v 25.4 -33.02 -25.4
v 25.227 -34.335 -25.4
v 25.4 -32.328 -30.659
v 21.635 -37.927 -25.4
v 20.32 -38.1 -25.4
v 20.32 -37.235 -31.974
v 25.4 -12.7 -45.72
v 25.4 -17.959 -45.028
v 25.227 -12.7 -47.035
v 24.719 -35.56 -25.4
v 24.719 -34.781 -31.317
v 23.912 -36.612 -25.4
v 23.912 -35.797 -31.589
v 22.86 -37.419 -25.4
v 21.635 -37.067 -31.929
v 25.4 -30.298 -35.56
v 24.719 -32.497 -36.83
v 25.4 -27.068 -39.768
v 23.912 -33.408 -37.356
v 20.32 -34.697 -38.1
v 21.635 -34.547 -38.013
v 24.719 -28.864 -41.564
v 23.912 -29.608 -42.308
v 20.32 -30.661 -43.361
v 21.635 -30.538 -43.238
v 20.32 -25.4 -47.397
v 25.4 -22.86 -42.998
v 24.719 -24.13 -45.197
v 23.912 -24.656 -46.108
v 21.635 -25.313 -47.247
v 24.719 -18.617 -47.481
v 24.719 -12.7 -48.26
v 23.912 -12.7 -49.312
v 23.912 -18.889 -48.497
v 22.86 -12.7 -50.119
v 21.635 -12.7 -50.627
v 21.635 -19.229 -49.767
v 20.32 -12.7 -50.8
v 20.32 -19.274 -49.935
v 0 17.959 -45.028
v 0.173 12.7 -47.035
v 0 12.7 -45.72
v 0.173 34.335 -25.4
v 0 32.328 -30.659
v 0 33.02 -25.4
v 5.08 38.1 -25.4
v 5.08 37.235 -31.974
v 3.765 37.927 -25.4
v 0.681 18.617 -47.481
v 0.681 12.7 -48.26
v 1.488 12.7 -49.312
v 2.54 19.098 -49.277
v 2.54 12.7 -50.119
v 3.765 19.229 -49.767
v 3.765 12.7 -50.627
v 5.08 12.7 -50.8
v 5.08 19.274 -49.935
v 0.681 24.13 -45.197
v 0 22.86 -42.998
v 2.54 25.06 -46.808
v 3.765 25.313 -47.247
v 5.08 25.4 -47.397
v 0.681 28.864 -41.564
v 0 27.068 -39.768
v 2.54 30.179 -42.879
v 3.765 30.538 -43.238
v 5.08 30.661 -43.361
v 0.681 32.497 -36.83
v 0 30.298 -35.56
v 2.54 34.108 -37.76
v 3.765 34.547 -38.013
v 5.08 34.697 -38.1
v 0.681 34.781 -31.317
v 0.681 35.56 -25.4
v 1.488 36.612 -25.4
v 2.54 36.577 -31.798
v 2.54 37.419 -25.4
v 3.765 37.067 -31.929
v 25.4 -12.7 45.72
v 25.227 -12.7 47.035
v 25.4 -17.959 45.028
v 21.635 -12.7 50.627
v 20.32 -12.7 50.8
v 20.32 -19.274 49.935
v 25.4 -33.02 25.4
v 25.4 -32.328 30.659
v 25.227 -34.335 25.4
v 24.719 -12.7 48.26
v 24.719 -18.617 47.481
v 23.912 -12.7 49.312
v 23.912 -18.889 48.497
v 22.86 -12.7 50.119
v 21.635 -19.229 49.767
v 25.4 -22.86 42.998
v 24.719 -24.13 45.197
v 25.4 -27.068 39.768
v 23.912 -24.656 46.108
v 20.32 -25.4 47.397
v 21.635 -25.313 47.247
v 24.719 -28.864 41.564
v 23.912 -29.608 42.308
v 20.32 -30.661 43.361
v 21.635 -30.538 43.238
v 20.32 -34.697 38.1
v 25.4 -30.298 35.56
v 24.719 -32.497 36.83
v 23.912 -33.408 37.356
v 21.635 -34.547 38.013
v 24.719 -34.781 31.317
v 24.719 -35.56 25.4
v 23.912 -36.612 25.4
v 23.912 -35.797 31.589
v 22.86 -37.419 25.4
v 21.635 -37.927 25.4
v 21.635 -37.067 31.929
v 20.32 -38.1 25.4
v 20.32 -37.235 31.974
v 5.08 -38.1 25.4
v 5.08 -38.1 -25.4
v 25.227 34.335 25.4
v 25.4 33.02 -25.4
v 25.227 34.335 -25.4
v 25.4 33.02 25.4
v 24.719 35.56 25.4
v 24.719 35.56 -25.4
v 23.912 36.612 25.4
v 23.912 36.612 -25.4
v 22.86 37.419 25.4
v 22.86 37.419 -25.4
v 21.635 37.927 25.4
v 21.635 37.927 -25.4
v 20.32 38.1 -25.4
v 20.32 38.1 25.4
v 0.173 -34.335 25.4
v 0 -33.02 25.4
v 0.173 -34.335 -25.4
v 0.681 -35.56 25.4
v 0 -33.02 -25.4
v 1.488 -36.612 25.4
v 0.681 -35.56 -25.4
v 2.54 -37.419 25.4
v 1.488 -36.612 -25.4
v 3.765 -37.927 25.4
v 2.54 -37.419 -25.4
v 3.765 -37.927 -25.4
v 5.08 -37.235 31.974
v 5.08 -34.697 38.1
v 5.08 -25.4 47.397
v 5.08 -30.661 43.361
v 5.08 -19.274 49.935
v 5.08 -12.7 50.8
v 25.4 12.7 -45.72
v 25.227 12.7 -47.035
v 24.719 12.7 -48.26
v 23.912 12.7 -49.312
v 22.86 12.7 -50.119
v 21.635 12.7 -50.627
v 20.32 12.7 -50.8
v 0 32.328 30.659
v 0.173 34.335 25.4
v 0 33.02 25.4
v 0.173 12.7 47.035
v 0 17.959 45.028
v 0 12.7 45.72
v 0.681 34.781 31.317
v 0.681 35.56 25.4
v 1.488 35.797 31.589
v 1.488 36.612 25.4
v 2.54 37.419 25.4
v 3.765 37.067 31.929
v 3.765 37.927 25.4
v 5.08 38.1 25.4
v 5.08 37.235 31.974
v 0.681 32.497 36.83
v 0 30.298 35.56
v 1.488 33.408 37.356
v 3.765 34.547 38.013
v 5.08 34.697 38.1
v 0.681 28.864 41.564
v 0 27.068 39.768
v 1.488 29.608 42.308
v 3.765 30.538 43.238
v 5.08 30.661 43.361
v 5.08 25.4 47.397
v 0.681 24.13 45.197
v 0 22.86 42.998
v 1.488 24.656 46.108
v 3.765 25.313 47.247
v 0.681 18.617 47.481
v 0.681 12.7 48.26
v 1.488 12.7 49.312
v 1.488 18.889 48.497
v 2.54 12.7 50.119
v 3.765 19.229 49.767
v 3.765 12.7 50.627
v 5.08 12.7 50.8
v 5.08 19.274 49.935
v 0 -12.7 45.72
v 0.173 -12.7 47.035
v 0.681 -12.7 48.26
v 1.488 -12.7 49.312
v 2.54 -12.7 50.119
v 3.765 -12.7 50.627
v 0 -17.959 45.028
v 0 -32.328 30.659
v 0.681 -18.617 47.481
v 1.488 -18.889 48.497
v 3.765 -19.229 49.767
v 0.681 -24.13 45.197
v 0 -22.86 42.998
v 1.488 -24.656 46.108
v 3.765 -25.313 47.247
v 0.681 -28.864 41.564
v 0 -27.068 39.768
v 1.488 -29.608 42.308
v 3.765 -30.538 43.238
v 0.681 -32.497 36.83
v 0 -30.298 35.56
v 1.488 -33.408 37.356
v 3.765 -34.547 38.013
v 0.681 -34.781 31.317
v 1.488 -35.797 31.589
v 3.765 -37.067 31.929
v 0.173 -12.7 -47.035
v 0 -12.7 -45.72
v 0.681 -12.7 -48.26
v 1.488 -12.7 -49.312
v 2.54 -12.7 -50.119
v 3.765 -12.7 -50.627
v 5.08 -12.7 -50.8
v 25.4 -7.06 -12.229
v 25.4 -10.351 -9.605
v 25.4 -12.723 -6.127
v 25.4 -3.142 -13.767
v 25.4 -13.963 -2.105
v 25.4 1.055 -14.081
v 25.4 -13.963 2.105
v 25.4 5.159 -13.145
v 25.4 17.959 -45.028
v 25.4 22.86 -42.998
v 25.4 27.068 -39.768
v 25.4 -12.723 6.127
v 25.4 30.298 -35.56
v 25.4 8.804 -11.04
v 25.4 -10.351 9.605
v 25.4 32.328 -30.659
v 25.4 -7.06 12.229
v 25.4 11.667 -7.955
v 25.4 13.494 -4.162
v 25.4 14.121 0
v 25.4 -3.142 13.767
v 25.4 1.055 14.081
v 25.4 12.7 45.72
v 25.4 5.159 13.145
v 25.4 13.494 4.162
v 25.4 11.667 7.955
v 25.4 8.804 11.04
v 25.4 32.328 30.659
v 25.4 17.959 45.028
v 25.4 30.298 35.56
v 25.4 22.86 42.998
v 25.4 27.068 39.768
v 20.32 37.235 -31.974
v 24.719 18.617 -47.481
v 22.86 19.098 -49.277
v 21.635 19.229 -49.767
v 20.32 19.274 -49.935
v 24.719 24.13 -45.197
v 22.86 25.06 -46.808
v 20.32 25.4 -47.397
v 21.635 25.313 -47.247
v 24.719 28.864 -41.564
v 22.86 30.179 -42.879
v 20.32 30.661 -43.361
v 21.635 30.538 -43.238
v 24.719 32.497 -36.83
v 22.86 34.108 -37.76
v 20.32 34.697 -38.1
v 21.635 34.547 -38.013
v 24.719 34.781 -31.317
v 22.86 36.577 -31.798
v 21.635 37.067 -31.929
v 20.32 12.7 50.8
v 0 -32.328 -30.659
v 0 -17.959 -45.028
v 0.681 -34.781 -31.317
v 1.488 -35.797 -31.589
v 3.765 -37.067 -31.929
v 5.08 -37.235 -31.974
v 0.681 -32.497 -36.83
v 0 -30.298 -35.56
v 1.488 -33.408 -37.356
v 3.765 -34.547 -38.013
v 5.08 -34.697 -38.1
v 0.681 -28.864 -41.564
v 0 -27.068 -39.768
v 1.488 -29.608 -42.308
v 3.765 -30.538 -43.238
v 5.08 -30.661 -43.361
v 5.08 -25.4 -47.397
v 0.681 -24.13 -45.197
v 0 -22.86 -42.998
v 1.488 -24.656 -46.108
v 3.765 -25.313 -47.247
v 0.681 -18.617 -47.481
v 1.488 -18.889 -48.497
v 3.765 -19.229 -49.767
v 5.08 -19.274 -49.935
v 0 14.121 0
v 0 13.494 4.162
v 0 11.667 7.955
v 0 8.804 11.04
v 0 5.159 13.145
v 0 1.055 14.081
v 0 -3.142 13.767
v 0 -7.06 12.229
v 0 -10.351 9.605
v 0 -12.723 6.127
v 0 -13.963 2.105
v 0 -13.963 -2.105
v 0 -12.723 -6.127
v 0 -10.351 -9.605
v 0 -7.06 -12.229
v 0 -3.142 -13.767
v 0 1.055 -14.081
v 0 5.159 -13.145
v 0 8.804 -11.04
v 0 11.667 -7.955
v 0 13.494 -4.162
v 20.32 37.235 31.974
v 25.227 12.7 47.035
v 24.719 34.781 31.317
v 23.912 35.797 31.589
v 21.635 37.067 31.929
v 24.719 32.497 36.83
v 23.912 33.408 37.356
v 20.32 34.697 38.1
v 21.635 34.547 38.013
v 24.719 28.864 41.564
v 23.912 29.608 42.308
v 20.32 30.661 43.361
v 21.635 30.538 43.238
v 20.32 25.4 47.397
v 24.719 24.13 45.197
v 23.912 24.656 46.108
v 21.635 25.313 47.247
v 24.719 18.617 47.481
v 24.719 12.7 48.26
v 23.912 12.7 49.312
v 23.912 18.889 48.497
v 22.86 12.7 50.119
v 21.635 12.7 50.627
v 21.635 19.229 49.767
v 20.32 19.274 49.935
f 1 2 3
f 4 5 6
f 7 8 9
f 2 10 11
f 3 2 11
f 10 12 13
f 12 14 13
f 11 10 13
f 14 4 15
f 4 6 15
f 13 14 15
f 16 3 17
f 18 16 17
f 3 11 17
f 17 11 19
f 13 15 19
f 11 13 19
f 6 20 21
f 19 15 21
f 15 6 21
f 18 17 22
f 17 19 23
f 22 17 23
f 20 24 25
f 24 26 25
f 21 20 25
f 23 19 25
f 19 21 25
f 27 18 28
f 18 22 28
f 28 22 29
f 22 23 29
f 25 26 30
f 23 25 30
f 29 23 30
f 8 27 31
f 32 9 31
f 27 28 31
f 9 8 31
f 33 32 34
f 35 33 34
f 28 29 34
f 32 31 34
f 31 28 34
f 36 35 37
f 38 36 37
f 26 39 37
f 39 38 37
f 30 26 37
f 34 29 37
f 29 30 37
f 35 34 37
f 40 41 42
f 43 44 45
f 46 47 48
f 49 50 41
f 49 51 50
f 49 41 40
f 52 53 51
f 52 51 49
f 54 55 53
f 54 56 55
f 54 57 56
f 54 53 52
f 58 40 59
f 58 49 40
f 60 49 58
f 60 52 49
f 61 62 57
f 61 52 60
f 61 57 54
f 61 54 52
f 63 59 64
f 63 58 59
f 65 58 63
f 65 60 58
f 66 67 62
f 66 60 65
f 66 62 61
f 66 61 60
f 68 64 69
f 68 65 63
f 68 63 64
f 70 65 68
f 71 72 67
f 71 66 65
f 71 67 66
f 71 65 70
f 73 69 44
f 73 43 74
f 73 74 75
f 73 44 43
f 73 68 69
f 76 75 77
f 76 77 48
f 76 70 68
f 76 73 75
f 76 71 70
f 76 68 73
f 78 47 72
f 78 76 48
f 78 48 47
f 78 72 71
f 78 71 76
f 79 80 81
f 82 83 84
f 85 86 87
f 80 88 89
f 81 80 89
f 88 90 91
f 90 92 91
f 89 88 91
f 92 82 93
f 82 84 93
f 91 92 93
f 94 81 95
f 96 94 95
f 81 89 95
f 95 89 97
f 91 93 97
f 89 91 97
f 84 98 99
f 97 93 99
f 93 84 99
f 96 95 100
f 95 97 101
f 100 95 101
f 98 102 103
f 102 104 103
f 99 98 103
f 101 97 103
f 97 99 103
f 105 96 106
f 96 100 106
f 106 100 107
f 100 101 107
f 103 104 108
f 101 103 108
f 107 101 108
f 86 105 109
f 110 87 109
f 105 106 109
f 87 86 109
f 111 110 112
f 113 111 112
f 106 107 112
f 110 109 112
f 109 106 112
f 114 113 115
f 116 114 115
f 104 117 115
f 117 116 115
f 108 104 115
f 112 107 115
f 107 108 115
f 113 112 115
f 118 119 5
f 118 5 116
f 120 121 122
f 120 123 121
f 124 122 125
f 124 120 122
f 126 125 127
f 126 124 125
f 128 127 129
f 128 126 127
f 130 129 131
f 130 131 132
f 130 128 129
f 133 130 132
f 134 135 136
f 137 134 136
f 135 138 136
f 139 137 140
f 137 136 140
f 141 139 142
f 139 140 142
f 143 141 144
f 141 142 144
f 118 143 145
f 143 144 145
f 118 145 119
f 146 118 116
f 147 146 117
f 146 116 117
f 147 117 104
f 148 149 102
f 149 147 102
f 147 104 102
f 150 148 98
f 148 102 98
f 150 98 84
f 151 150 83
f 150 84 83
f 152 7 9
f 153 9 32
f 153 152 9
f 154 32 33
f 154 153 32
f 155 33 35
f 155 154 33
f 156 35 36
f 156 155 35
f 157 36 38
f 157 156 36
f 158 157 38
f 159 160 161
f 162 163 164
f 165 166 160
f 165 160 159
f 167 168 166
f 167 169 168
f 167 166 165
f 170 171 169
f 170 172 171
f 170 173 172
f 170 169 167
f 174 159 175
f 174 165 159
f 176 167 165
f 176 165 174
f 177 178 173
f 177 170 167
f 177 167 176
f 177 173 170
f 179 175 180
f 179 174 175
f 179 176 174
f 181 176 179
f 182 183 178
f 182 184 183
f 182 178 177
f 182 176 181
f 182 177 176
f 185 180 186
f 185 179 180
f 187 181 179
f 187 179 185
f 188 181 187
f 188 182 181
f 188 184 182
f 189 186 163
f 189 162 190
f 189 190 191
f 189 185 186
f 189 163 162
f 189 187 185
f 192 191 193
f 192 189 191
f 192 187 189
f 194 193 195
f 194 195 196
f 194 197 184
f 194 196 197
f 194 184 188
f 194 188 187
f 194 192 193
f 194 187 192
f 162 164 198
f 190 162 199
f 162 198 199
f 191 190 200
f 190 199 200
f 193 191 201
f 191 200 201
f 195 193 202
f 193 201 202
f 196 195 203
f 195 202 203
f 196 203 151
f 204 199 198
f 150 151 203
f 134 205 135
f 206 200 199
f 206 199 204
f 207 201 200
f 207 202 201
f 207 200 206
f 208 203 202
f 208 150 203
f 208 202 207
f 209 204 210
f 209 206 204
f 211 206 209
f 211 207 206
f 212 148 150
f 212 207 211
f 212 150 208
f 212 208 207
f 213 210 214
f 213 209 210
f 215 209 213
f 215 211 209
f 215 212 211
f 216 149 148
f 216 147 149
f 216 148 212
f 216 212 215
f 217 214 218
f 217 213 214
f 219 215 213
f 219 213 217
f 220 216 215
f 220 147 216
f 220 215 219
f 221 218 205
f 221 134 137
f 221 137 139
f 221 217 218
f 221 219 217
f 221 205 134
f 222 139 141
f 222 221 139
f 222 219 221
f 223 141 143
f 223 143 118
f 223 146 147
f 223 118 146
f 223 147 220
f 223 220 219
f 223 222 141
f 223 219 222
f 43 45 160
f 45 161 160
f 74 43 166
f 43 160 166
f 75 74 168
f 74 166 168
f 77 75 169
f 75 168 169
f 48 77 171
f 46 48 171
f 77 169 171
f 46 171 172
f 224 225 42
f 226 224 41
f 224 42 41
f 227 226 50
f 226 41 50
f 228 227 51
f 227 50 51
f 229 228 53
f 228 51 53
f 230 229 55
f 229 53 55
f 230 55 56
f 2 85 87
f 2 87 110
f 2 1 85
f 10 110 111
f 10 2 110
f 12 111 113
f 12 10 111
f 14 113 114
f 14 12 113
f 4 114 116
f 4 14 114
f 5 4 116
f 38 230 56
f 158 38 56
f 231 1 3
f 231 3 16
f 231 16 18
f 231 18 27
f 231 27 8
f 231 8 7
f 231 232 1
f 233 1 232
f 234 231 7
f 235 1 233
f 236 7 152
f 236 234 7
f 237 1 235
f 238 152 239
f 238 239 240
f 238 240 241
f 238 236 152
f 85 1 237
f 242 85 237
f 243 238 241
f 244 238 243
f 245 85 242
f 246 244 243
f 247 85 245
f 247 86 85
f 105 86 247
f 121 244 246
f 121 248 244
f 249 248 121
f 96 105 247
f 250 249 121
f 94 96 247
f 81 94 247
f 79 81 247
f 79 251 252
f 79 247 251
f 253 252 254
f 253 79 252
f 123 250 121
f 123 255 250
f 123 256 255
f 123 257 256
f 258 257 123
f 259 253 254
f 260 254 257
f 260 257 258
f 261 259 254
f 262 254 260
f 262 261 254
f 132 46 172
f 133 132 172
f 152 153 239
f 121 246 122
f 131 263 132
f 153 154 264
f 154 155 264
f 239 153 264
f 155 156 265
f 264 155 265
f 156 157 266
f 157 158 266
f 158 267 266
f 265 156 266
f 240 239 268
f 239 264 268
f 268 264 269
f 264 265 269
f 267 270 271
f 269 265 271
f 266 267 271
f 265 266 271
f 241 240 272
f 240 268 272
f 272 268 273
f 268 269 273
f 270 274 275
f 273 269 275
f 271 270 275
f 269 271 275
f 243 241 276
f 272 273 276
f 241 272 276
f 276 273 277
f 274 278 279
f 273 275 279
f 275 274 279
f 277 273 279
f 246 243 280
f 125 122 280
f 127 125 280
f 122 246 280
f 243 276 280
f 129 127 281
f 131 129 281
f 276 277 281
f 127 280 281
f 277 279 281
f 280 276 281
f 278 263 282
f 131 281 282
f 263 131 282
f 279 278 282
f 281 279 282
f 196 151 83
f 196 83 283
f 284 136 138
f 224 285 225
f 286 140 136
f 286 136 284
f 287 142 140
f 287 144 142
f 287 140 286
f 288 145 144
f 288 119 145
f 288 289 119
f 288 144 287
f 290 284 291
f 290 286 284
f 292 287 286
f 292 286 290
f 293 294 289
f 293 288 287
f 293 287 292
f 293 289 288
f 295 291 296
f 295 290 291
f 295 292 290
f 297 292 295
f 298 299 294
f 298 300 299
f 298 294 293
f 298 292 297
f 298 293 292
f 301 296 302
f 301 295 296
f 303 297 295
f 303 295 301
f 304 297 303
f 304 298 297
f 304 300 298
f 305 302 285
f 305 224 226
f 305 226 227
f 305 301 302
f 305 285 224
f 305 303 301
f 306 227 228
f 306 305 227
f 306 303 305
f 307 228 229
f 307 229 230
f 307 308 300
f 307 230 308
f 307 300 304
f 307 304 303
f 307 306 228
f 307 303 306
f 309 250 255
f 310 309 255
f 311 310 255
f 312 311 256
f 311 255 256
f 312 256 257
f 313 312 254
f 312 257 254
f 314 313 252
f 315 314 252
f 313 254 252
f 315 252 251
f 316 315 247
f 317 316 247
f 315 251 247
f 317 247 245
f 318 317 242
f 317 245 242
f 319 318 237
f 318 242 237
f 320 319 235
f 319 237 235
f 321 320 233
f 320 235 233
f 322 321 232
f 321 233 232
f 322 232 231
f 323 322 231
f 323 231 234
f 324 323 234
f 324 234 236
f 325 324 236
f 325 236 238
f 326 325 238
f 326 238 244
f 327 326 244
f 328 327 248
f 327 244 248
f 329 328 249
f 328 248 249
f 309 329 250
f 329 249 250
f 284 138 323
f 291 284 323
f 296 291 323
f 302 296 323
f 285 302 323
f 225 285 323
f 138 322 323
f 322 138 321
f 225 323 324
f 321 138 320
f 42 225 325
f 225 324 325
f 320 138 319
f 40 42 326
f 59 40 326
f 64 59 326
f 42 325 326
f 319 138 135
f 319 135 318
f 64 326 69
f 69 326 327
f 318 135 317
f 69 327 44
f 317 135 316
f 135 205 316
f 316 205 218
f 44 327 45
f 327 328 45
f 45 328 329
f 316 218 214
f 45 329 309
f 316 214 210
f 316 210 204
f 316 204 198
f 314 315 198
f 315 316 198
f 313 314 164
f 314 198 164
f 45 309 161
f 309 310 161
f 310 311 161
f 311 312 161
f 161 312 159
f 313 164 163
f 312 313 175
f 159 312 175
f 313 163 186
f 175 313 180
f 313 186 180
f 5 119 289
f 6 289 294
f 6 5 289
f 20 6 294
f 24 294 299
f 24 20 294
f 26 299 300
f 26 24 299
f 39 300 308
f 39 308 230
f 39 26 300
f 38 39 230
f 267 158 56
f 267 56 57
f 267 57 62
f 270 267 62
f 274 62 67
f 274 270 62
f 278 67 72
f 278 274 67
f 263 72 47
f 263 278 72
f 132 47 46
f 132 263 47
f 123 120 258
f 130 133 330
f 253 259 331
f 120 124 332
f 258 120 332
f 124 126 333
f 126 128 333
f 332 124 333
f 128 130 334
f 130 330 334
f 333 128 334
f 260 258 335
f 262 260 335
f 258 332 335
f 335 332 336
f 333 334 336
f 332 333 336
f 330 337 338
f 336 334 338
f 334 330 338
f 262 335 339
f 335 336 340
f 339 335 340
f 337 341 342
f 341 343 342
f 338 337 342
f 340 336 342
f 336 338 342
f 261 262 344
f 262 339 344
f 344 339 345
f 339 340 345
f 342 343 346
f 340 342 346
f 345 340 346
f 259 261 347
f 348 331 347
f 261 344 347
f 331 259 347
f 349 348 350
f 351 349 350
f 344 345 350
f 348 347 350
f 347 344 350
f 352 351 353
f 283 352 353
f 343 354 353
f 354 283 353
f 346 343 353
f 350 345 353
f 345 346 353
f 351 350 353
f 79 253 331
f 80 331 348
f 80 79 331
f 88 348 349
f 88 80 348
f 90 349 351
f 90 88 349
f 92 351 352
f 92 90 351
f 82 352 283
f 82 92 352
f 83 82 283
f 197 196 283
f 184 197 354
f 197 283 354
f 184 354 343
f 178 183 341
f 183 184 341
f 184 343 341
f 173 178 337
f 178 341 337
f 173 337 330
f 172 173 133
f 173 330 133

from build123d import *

# Parameters (mm, degrees)
F0_W     = 76.2
F0_H     = 101.6
F1_DEPTH = 25.4
F2_R     = 14.120977
F3_DEPTH = 25.4
F4_R     = 25.4
F5_R     = 5.08


with BuildPart() as f1:
    # F0 (on Right) → F1 (new body)
    with BuildSketch(Plane.YZ):
        Rectangle(F0_W, F0_H)
    extrude(amount=F1_DEPTH)

    # F2 (on face) → F3 (cut)
    with BuildSketch(Plane.YZ.offset(25.4)):
        Circle(F2_R)
    extrude(amount=-F3_DEPTH, mode=Mode.SUBTRACT)

    # F4
    f4_edges = [f1.edges().sort_by_distance(p)[0] for p in [
        (12.7, -38.1, 50.8),
        (12.7, -38.1, -50.8),
        (12.7, 38.1, 50.8),
        (12.7, 38.1, -50.8),
    ]]
    fillet(f4_edges, radius=F4_R)

    # F5
    f5_edges = [f1.edges().sort_by_distance(p)[0] for p in [
        (25.4, 38.1, 0),
        (0, 38.1, 0),
    ]]
    fillet(f5_edges, radius=F5_R)


solid = f1.part
